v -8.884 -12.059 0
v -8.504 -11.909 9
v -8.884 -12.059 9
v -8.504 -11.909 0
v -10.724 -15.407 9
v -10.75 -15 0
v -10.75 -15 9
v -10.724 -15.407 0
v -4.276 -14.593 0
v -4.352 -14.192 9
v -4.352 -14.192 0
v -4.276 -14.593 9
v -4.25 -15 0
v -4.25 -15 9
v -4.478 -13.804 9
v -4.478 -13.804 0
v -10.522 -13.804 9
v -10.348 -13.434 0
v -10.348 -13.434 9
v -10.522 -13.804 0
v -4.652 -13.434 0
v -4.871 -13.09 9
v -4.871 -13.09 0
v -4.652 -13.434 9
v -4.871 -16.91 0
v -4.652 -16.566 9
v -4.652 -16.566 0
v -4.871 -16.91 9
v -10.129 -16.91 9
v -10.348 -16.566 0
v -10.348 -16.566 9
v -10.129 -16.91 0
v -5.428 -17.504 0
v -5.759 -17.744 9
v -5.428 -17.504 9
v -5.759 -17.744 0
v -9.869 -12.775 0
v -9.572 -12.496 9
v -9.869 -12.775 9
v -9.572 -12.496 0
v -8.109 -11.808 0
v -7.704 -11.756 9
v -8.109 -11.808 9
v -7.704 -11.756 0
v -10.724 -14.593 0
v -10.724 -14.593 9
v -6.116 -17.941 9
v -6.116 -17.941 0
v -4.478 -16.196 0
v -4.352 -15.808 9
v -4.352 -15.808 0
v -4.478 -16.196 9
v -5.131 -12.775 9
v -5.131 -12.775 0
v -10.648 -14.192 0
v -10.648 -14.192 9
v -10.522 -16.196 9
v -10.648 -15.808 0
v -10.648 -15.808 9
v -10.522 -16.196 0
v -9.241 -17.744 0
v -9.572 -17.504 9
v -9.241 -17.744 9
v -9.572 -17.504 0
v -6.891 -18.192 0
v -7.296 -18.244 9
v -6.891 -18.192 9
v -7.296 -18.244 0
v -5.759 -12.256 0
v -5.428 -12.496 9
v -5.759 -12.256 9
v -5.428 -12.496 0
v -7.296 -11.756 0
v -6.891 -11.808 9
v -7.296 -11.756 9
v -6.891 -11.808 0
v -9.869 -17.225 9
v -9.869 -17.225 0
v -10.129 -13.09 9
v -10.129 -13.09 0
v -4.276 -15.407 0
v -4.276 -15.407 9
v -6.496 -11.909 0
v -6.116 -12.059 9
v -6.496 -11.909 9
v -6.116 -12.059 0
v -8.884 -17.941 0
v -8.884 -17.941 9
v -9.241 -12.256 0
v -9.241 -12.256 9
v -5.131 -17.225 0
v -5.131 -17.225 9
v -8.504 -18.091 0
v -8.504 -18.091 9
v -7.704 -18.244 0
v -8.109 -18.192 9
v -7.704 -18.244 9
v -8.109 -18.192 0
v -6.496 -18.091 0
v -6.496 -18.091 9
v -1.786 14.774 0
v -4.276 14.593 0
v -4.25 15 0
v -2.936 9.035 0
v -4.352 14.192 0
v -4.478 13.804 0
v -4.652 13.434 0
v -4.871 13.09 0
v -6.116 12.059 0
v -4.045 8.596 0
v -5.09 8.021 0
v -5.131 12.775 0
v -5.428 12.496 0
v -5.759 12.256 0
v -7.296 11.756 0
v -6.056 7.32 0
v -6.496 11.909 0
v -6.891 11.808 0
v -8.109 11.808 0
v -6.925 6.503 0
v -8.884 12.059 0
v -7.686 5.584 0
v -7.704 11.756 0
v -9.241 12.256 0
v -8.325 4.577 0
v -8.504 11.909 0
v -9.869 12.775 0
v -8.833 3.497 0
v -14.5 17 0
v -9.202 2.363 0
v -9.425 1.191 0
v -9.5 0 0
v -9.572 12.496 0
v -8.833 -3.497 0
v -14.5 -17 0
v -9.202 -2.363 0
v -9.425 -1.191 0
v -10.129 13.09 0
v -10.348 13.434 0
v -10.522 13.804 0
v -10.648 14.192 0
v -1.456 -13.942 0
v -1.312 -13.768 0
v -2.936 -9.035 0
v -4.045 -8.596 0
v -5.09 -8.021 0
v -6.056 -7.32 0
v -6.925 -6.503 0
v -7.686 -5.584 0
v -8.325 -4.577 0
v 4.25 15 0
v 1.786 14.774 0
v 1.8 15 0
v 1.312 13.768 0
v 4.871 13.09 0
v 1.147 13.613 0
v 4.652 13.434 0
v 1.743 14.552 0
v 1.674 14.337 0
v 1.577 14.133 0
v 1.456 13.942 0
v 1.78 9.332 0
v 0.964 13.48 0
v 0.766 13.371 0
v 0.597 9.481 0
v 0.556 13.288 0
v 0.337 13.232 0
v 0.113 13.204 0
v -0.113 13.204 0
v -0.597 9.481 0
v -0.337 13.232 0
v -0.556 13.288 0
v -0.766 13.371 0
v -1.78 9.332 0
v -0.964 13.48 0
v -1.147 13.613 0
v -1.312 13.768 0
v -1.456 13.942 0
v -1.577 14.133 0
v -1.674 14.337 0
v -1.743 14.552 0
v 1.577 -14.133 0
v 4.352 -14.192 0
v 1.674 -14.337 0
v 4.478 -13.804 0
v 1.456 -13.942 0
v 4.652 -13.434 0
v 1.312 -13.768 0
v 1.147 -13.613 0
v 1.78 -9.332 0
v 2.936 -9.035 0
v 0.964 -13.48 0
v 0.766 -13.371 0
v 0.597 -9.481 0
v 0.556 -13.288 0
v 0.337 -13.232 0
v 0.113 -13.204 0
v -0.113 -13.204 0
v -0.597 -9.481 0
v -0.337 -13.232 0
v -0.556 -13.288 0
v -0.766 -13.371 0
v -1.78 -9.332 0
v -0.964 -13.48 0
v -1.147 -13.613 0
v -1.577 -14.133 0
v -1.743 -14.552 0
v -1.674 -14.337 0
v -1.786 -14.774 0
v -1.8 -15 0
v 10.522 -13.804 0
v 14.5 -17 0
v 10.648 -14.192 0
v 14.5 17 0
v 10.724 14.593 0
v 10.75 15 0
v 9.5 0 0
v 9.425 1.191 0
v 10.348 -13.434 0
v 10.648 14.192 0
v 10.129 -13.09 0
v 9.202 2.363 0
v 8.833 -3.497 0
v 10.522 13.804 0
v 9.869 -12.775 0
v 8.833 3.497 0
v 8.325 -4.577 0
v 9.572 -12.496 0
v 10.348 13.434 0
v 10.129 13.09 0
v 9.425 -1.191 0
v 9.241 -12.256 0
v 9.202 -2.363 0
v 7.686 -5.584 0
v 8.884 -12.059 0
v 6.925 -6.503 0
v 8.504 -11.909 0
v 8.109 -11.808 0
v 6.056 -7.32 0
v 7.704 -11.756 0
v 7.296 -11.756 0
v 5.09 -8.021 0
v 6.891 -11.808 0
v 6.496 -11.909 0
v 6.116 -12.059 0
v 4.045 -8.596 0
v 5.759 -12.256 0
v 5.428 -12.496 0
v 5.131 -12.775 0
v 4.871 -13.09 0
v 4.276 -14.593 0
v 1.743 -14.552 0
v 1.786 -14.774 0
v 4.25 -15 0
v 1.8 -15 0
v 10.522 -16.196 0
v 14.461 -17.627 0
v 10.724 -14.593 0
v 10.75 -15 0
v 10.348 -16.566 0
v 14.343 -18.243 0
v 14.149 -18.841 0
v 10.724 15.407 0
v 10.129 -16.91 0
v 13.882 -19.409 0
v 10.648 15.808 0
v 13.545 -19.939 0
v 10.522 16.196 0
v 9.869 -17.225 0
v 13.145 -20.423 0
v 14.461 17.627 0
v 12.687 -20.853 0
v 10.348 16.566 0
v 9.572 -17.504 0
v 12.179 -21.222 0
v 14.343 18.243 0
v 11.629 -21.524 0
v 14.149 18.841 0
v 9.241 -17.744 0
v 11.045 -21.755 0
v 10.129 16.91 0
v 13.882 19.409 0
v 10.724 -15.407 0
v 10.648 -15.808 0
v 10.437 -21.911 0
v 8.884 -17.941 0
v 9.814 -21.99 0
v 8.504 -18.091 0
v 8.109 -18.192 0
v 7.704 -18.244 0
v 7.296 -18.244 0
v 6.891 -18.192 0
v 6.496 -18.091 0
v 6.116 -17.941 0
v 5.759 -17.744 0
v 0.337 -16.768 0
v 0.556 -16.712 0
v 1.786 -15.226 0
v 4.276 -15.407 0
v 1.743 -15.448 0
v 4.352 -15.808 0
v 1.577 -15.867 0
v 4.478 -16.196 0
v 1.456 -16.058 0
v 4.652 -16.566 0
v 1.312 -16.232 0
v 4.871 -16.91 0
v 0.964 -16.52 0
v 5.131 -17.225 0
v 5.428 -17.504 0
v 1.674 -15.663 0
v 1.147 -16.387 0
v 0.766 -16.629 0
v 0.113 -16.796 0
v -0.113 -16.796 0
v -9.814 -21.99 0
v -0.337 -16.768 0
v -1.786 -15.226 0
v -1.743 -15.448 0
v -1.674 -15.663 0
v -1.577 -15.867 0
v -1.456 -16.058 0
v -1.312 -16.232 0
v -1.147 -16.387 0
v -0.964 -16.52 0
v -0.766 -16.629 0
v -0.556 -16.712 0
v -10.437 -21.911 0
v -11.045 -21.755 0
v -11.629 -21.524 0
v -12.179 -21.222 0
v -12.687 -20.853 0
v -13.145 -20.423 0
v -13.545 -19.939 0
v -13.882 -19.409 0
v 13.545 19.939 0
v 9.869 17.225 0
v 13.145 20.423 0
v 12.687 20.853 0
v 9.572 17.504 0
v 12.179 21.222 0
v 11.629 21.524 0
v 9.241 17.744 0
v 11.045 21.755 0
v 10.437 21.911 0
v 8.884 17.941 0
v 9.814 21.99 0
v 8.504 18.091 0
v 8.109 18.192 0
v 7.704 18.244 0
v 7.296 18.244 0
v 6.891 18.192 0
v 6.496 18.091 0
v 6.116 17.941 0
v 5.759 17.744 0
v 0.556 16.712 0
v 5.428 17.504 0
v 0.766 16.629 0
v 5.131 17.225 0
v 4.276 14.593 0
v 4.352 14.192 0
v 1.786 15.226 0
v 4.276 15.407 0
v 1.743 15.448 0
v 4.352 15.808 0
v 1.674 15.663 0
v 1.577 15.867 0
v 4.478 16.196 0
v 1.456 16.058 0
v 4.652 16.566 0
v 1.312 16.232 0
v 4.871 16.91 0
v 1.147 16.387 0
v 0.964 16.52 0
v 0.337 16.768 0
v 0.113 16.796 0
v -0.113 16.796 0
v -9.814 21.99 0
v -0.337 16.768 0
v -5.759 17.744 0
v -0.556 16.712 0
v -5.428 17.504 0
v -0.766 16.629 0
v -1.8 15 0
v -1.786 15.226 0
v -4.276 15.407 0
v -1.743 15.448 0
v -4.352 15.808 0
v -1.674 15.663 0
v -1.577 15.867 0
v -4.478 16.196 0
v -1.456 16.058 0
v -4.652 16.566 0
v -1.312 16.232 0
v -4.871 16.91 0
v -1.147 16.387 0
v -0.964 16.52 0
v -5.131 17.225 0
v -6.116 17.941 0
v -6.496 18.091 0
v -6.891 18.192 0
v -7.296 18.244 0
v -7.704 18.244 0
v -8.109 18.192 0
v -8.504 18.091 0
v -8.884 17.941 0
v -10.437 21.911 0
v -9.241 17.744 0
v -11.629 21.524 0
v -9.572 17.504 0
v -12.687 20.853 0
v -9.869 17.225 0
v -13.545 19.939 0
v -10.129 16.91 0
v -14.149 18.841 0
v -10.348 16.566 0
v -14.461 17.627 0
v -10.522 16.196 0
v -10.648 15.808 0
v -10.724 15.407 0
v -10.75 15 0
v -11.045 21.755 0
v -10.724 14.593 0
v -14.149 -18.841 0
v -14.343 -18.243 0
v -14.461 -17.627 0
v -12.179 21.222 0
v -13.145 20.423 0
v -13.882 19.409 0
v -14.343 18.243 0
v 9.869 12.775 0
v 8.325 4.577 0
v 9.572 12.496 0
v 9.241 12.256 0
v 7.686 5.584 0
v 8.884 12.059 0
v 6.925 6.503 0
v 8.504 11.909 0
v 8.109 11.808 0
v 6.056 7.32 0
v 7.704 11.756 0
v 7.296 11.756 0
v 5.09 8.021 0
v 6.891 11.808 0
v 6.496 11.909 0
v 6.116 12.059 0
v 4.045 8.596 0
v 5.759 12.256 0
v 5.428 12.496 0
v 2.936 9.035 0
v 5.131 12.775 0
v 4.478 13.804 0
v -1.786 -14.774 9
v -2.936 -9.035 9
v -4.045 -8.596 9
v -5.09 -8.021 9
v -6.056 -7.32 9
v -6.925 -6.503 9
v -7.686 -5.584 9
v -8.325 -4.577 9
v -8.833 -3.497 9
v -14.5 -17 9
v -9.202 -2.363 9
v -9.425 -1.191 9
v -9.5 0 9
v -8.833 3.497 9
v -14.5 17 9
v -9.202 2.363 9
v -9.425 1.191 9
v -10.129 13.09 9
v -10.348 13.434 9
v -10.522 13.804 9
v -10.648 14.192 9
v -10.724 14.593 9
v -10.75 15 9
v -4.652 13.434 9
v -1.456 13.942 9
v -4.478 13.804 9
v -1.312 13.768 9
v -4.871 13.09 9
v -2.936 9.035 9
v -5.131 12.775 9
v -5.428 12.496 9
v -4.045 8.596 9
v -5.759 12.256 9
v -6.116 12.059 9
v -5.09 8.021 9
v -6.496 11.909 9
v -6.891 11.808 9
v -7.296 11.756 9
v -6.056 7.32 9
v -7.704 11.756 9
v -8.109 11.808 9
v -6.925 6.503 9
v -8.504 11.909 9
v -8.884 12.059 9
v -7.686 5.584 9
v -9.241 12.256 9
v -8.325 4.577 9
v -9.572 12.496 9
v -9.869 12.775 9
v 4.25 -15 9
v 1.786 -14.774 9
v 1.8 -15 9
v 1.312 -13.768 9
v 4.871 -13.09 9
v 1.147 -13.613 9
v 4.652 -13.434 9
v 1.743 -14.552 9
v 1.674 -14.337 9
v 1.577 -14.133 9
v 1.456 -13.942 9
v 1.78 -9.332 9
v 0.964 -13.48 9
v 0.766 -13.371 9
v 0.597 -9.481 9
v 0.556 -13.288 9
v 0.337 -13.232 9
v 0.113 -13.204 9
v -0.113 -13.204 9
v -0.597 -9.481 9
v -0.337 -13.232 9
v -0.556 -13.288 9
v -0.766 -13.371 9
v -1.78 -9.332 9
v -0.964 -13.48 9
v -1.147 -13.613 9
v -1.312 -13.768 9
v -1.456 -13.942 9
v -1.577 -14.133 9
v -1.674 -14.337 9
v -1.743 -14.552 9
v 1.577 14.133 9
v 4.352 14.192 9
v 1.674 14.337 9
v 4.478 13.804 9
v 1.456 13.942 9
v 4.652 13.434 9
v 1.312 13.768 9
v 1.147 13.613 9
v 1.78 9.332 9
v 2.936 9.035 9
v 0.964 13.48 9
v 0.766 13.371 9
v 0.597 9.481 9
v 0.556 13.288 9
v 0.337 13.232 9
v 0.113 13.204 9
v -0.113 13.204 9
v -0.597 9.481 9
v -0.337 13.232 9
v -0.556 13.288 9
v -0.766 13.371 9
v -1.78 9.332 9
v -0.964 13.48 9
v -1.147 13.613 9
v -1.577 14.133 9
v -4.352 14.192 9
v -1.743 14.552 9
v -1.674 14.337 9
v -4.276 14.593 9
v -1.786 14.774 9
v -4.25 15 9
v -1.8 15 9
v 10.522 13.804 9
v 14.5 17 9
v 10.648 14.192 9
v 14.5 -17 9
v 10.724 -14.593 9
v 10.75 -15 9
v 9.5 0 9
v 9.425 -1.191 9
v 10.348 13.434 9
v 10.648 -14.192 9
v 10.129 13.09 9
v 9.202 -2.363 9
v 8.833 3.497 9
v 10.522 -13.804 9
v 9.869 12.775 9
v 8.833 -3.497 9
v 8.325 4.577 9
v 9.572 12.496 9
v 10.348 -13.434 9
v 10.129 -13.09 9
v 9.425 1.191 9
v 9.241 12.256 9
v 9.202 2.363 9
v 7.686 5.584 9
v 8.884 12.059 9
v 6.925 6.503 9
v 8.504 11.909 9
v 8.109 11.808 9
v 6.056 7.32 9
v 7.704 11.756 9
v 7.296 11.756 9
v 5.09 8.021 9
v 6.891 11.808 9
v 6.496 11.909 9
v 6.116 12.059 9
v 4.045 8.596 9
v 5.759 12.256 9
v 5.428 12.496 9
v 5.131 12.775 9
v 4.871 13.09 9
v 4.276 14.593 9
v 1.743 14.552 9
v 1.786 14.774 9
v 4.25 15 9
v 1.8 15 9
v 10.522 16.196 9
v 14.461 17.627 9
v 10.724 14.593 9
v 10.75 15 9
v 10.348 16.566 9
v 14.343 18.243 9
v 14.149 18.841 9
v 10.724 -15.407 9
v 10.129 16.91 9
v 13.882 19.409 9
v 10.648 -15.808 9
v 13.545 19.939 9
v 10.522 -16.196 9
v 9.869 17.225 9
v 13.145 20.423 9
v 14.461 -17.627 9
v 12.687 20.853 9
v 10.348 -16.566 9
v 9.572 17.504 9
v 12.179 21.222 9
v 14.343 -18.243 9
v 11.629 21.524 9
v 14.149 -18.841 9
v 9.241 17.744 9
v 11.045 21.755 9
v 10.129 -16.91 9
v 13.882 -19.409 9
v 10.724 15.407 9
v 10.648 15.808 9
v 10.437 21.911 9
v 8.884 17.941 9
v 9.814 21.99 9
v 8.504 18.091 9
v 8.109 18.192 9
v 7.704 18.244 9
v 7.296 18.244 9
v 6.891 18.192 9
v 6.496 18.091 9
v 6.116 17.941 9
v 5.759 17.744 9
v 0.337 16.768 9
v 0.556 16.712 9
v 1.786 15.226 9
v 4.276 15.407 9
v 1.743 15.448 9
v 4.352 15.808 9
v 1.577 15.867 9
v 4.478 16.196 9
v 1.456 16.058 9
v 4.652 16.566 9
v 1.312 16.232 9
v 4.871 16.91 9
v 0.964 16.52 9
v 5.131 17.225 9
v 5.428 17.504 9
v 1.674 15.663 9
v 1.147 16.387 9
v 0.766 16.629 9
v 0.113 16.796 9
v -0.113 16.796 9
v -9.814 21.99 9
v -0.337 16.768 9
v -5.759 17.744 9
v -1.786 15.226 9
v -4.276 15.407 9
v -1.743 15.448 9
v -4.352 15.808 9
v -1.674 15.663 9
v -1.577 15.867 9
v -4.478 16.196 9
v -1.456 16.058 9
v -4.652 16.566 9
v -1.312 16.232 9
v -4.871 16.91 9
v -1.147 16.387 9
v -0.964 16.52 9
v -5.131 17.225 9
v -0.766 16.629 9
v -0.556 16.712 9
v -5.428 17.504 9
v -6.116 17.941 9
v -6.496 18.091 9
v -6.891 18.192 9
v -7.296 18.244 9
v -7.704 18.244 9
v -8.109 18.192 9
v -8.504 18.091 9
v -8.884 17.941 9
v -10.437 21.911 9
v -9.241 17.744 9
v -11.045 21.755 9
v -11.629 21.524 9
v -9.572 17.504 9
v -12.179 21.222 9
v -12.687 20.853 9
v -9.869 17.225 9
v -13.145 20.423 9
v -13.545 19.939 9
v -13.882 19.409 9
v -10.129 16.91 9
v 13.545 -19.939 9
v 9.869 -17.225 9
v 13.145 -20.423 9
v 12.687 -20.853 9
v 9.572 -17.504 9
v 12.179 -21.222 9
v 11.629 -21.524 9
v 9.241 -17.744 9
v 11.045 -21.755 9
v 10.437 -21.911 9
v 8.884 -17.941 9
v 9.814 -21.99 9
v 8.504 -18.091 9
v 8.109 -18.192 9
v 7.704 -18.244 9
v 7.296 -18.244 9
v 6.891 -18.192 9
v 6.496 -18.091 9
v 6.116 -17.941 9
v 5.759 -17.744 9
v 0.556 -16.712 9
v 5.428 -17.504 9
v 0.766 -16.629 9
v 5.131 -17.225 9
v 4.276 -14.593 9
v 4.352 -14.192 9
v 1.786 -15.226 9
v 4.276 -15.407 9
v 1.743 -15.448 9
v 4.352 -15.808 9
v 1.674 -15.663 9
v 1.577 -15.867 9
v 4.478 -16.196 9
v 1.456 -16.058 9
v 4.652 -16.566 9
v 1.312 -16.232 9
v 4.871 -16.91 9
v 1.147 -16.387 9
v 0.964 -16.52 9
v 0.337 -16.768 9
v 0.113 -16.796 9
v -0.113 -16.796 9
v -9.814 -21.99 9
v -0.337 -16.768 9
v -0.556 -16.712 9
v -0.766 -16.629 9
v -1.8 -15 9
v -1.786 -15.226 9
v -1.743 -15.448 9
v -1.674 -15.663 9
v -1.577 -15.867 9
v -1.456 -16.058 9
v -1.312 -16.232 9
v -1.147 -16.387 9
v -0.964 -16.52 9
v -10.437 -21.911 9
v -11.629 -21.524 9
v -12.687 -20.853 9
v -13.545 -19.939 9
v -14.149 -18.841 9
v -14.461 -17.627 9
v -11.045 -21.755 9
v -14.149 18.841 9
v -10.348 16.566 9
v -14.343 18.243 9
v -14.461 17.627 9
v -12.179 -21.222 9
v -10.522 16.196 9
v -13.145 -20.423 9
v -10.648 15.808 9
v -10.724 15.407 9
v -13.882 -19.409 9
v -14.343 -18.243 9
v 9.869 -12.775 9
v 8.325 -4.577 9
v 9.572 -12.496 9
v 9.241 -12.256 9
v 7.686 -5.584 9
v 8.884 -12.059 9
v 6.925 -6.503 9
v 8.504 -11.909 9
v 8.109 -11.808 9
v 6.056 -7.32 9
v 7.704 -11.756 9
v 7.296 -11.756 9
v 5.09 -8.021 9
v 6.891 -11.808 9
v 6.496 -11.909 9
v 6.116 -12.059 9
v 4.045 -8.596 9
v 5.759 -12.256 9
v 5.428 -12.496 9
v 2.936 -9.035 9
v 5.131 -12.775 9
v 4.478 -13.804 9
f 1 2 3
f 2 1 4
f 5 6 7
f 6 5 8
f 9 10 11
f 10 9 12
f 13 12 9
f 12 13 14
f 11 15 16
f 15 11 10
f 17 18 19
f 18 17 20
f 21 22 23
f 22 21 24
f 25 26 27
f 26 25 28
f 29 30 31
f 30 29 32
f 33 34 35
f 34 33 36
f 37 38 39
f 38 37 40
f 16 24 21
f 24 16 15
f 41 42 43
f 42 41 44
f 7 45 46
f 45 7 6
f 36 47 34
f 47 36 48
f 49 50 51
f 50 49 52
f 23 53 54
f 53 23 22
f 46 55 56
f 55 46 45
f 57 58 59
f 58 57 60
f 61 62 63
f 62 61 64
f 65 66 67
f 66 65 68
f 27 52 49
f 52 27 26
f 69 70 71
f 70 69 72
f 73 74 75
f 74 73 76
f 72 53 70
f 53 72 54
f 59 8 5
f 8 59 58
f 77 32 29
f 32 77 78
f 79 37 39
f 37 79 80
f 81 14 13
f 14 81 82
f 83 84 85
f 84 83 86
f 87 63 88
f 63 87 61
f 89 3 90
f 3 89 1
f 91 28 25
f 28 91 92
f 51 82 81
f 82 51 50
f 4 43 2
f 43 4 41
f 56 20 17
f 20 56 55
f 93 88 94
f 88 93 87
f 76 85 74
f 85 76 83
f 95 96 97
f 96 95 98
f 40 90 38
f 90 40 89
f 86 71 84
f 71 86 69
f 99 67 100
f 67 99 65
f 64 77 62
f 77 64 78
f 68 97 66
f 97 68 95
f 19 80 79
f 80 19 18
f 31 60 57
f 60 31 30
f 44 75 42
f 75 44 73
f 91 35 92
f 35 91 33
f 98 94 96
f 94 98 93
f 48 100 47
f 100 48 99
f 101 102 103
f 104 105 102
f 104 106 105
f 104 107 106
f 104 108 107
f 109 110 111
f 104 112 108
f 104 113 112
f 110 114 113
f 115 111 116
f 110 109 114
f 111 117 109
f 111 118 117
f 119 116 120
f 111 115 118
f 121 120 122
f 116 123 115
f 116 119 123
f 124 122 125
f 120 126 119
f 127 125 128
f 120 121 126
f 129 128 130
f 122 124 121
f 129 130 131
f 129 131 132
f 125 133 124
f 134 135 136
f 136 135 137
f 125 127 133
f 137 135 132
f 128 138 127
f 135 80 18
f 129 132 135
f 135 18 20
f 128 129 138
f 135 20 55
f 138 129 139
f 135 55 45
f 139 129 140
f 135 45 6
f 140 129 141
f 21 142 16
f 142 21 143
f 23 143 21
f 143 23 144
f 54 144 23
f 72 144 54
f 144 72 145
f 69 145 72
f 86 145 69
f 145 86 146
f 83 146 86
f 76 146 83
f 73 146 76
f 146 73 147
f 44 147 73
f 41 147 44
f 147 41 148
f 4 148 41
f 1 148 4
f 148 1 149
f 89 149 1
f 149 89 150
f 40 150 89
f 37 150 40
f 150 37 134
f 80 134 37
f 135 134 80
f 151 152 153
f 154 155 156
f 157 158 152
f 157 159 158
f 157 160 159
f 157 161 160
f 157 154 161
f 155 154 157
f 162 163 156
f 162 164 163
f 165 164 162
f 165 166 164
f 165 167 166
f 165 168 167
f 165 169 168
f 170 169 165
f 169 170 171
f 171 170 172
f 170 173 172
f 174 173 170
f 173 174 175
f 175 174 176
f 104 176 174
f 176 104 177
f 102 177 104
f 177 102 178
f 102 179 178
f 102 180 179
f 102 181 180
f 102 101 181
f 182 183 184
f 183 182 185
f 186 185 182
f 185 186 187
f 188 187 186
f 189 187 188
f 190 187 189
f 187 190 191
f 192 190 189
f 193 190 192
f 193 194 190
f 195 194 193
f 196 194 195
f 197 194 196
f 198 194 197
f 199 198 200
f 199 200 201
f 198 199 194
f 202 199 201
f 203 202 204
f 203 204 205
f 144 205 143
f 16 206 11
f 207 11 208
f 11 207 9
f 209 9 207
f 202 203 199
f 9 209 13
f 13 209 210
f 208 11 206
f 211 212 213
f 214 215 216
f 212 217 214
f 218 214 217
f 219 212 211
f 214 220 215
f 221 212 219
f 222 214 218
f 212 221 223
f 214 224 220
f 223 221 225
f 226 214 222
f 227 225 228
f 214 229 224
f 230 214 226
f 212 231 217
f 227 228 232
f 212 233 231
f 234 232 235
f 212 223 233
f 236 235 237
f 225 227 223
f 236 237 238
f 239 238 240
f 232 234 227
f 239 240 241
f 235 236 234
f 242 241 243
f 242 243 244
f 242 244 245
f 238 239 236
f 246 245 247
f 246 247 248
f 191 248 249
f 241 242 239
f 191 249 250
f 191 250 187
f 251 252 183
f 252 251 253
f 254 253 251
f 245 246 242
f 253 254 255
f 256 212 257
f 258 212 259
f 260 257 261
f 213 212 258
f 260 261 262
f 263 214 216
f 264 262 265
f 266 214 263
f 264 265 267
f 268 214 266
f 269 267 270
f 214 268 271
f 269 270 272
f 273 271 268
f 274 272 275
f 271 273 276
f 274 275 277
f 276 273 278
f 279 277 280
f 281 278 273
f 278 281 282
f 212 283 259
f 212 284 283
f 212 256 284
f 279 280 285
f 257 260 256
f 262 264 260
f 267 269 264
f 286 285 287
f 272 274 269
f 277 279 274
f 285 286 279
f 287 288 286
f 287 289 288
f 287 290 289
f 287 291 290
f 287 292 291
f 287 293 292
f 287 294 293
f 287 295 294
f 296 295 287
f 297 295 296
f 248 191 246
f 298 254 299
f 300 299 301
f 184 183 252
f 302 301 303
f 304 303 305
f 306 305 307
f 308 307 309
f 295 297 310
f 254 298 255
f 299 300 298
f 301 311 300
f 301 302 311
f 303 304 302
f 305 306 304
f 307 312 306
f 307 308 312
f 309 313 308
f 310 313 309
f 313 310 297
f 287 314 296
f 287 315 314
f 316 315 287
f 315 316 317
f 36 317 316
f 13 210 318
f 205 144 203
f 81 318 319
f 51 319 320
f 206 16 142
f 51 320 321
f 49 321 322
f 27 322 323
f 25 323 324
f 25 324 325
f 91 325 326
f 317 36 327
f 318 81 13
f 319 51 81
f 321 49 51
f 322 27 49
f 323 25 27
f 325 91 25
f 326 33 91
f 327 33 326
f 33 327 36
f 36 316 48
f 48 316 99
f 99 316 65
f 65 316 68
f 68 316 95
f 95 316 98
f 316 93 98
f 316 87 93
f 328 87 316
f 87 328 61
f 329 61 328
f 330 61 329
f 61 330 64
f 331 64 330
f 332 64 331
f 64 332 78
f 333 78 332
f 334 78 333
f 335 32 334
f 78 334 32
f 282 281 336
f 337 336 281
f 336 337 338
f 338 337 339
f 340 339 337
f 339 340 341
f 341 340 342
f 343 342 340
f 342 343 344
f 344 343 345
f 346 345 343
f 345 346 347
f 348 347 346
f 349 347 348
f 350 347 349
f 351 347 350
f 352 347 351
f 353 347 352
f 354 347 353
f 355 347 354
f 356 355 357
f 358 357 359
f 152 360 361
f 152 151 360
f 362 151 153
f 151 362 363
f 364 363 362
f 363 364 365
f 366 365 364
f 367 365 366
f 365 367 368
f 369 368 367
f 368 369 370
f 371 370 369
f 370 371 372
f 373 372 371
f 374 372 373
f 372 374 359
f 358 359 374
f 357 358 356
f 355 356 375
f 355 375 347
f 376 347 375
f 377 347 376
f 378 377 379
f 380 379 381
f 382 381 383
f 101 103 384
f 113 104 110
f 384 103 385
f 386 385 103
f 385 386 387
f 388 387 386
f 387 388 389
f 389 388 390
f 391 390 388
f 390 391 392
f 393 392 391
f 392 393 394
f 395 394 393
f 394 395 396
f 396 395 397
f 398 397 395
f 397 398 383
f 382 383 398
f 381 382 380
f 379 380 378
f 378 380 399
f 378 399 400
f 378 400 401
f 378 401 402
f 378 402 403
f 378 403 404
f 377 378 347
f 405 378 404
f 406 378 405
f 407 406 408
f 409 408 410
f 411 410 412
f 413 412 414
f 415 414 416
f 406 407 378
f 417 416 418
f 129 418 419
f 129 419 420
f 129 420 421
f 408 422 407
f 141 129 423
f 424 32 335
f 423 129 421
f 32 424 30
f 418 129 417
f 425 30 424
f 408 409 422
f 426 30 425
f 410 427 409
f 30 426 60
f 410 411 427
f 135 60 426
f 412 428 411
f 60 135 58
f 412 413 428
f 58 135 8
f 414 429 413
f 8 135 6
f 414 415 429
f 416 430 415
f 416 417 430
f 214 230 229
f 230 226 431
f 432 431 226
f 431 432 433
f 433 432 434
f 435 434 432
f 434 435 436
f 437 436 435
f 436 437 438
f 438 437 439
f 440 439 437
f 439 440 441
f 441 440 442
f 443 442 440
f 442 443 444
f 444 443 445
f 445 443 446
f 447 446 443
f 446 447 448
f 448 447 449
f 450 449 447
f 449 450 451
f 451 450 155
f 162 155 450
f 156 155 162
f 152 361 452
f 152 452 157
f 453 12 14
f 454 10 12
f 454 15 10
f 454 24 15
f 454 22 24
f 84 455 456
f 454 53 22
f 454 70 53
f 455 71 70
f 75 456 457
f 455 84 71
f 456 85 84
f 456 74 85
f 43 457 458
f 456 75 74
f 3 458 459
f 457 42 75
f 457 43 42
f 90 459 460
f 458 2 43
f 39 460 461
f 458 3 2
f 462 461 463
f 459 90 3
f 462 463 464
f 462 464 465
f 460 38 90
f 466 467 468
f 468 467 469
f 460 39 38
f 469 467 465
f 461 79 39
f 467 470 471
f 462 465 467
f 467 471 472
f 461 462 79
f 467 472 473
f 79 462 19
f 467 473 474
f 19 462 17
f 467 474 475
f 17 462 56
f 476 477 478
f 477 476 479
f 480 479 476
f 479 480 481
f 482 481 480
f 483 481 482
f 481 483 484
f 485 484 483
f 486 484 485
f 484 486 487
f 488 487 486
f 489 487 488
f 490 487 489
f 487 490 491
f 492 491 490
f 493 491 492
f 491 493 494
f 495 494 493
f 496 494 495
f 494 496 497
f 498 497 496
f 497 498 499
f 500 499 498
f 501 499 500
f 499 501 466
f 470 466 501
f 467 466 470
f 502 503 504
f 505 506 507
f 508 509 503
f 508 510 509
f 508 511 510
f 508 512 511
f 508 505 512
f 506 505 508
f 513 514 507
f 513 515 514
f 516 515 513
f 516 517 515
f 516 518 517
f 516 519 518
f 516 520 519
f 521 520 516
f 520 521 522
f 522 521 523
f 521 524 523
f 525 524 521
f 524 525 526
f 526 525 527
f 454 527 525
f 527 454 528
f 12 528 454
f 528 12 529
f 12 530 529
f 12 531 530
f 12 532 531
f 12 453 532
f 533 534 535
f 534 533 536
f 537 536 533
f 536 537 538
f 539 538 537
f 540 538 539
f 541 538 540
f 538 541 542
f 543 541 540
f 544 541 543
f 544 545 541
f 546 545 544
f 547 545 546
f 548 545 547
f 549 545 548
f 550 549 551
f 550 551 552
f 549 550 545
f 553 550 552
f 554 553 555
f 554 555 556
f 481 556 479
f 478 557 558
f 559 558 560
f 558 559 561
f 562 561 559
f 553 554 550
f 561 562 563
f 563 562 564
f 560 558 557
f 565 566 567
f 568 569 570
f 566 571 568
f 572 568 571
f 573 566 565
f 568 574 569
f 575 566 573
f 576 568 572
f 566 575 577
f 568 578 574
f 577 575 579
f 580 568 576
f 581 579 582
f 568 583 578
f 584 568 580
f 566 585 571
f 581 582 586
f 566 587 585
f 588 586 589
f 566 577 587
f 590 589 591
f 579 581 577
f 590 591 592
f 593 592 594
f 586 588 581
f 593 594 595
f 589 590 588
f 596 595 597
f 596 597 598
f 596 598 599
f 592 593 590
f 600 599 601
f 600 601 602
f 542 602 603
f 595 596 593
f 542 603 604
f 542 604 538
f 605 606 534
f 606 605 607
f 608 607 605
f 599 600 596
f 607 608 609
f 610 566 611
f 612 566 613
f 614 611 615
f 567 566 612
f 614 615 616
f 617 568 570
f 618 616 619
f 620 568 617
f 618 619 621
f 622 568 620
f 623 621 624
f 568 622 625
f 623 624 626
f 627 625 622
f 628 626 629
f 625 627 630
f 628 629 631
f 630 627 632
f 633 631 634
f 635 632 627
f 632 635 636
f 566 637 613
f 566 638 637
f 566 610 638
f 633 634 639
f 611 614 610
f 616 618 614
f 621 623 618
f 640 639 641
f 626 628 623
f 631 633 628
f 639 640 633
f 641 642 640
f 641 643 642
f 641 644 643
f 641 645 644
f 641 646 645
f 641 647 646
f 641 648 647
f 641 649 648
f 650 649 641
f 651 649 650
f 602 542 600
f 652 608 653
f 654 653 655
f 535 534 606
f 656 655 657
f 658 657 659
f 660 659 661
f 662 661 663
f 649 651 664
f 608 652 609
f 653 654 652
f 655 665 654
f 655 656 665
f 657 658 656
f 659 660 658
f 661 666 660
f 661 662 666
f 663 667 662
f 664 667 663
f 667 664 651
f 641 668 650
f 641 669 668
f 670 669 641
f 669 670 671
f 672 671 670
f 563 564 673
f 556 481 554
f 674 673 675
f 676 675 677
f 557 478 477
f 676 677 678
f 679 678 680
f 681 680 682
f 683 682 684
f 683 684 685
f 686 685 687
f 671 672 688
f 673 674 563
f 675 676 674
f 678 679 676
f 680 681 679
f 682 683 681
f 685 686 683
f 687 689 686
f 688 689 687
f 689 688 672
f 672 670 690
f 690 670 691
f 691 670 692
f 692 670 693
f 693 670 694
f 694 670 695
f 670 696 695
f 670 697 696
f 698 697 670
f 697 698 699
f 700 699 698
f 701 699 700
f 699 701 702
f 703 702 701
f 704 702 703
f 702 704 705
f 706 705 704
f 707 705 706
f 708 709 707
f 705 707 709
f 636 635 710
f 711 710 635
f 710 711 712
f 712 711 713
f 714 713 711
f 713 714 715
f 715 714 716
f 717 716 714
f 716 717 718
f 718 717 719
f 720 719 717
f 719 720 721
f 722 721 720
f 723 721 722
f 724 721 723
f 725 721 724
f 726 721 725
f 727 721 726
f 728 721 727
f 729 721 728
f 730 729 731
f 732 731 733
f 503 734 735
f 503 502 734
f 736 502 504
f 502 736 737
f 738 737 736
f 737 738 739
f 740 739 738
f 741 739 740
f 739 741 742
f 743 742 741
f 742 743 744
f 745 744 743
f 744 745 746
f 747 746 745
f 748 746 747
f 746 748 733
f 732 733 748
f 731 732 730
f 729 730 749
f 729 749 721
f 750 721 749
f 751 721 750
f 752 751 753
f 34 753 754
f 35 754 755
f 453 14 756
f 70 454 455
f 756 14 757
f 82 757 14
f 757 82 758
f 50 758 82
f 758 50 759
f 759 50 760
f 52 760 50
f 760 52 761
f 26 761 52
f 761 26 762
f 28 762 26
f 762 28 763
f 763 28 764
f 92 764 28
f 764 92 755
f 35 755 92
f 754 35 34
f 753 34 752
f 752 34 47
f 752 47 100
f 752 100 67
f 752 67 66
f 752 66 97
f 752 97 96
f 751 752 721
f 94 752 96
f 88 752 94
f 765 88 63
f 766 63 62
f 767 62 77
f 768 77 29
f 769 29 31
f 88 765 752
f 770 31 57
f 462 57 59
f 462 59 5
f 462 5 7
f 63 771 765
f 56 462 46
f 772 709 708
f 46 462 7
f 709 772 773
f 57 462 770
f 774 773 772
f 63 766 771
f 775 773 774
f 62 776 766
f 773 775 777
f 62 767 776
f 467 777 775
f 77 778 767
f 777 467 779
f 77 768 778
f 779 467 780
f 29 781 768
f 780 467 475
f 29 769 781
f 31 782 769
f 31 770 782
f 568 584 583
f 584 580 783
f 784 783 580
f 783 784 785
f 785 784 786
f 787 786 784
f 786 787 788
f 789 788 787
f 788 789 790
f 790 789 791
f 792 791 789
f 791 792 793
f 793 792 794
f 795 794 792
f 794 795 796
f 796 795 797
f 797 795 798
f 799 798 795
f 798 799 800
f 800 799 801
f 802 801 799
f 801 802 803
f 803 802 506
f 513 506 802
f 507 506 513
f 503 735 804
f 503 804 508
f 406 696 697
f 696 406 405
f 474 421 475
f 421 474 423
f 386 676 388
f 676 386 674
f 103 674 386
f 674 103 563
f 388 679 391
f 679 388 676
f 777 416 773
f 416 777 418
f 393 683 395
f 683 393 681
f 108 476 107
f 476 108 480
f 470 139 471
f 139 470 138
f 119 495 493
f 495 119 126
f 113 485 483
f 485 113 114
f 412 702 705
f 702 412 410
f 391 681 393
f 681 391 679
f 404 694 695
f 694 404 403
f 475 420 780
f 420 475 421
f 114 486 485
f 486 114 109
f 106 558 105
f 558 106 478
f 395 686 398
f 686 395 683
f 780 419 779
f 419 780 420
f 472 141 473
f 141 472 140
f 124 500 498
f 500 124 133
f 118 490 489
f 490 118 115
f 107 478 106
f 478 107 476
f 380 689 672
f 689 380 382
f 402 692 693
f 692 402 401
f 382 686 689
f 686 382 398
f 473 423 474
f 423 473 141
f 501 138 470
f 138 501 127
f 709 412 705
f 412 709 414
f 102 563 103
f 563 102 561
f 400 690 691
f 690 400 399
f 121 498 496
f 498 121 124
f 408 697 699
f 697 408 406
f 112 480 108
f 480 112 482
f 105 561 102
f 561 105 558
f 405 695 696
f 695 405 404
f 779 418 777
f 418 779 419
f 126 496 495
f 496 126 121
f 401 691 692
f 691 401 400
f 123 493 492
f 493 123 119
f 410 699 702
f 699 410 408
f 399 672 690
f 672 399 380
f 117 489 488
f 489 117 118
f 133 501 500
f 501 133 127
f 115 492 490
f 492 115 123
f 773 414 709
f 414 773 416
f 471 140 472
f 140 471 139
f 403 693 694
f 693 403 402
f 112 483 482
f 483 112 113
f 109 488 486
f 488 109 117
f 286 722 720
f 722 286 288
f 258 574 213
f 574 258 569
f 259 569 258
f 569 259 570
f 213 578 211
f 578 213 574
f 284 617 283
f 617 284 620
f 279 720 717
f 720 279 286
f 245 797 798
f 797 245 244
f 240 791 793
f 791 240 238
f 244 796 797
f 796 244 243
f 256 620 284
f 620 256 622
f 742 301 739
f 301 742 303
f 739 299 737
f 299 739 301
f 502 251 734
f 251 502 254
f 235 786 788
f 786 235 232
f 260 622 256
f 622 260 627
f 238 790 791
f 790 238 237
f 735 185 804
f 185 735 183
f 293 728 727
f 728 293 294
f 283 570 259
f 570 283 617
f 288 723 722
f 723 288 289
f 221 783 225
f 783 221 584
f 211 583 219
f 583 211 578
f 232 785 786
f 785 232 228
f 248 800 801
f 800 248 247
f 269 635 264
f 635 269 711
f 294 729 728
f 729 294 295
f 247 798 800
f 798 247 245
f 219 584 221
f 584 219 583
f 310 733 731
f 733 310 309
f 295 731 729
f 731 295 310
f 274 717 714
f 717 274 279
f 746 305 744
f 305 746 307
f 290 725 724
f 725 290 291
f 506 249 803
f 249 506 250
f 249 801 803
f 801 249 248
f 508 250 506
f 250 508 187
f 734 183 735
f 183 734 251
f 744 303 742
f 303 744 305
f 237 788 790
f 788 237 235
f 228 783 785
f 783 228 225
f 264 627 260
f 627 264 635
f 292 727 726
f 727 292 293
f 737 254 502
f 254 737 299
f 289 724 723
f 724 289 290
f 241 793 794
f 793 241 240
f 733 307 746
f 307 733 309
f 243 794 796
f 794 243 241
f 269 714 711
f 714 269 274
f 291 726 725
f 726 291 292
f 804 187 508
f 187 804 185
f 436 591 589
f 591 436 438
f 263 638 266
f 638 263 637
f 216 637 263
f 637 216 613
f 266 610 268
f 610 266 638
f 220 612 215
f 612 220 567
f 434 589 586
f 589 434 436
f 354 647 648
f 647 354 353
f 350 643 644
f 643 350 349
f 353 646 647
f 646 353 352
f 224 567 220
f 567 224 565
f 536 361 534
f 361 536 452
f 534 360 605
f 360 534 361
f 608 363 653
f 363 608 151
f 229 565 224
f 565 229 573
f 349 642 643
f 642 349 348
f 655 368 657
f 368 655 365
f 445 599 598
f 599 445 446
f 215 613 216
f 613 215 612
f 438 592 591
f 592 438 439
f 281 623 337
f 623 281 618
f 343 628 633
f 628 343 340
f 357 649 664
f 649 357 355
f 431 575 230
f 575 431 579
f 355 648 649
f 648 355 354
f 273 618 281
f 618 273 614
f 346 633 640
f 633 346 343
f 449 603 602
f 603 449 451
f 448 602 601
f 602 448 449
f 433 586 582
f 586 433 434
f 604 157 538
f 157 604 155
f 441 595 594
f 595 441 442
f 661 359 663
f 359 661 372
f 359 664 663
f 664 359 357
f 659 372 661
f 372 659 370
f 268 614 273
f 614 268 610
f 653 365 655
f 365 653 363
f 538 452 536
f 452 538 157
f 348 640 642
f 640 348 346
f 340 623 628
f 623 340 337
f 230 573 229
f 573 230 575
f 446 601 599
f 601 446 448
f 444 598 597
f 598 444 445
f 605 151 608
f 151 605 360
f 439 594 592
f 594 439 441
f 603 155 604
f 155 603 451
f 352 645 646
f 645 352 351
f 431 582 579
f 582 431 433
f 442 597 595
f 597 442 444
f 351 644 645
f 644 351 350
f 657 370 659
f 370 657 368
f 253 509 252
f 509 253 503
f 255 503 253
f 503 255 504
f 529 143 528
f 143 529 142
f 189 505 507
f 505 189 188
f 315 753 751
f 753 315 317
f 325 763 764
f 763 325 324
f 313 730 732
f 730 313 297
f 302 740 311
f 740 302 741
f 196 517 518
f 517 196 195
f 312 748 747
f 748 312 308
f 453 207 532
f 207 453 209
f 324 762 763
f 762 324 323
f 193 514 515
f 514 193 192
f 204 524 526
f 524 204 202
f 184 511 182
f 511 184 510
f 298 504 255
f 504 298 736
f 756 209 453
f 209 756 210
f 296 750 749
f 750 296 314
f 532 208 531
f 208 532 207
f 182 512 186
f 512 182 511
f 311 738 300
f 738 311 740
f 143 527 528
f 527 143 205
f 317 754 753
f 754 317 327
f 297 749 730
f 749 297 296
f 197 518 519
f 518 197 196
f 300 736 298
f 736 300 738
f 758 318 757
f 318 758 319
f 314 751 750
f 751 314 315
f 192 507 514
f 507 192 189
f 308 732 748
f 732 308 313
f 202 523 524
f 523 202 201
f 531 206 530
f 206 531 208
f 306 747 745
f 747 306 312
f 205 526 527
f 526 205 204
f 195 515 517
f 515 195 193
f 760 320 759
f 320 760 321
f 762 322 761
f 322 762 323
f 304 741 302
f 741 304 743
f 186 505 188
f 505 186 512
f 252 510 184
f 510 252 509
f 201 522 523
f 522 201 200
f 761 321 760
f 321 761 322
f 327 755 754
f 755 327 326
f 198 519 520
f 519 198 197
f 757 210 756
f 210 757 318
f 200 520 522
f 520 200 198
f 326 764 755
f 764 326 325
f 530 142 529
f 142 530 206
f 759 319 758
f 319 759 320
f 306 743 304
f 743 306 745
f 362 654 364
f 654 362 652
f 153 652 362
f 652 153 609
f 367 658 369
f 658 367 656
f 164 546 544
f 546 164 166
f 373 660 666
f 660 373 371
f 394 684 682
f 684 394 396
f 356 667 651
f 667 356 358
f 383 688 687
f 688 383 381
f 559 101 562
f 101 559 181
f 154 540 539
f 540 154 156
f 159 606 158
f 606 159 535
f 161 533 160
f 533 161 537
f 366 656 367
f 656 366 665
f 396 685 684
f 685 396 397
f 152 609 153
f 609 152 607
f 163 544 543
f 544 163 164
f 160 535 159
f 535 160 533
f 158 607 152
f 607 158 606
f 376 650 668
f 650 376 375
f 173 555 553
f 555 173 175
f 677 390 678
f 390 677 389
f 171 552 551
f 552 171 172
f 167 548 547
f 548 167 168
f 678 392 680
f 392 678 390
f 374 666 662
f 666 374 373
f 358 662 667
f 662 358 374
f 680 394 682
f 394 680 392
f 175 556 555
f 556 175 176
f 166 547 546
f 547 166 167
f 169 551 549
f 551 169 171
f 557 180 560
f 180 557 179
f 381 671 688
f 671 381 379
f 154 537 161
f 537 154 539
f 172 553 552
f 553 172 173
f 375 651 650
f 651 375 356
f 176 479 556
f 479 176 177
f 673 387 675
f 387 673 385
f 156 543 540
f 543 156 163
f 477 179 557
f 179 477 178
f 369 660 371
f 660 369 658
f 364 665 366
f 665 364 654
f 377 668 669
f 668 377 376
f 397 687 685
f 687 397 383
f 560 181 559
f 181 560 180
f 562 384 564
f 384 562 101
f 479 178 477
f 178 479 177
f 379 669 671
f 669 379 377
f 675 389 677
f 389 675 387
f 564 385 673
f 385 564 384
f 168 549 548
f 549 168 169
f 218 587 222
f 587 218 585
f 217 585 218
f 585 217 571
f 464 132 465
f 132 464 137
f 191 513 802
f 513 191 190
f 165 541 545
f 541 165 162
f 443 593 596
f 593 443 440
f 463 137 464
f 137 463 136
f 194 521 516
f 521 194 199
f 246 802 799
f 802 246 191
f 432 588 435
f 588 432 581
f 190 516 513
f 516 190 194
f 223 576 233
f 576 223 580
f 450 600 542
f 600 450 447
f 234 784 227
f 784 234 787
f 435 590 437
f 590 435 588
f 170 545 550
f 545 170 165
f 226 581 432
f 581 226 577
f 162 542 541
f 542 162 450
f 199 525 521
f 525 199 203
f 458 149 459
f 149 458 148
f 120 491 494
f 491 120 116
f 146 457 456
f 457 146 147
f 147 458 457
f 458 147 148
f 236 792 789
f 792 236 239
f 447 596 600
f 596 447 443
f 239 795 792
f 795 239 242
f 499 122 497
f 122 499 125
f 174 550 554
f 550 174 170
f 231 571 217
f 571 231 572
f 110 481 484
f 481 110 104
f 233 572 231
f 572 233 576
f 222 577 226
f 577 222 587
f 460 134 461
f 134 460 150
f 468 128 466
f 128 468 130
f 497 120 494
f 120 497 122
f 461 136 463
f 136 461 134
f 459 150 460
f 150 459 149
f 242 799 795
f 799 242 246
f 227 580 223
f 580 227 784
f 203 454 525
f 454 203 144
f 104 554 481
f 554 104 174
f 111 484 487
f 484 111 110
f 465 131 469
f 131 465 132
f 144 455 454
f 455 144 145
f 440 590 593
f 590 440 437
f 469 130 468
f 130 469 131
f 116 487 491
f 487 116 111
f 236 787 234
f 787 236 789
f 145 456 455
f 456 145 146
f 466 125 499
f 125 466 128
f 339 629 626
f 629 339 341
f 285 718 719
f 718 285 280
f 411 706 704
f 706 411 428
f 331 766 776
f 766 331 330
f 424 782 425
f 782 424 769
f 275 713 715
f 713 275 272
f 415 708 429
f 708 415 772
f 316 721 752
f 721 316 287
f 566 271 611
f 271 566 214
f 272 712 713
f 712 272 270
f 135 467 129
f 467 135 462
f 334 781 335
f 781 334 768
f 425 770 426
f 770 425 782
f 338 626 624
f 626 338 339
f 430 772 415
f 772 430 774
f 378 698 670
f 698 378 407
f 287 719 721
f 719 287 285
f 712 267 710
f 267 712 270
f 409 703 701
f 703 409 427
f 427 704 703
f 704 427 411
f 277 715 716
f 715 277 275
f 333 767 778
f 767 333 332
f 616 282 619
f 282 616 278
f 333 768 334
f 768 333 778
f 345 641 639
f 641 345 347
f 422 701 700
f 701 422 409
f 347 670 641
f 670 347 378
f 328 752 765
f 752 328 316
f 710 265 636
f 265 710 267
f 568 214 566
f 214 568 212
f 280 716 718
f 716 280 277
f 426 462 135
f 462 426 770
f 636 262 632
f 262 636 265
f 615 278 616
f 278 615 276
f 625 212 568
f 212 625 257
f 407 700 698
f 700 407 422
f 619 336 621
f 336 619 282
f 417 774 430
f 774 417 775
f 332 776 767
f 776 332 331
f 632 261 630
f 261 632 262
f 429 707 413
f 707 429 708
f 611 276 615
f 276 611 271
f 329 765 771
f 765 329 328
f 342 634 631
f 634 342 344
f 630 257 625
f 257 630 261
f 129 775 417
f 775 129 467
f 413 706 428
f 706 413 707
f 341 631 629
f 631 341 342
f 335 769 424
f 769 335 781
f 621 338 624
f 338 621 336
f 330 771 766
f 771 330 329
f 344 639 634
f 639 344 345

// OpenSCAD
$fn = 50;

difference() {
	union() {
		hull() {
			translate(v = [-9.5, 17.0, 0]) {
				cylinder(h = 9, r = 5);
			}
			translate(v = [9.5, 17.0, 0]) {
				cylinder(h = 9, r = 5);
			}
			translate(v = [-9.5, -17.0, 0]) {
				cylinder(h = 9, r = 5);
			}
			translate(v = [9.5, -17.0, 0]) {
				cylinder(h = 9, r = 5);
			}
		}
	}
	union() {
		translate(v = [-7.5, -15.0, 0]) {
			cylinder(h = 9, r = 3.25);
		}
		translate(v = [-7.5, 15.0, 0]) {
			cylinder(h = 9, r = 3.25);
		}
		translate(v = [7.5, -15.0, 0]) {
			cylinder(h = 9, r = 3.25);
		}
		translate(v = [7.5, 15.0, 0]) {
			cylinder(h = 9, r = 3.25);
		}
		translate(v = [0.0, -15.0, 0]) {
			cylinder(h = 9, r = 1.8);
		}
		translate(v = [0.0, 15.0, 0]) {
			cylinder(h = 9, r = 1.8);
		}
		cylinder(h = 9, r = 9.5);
	}
}
